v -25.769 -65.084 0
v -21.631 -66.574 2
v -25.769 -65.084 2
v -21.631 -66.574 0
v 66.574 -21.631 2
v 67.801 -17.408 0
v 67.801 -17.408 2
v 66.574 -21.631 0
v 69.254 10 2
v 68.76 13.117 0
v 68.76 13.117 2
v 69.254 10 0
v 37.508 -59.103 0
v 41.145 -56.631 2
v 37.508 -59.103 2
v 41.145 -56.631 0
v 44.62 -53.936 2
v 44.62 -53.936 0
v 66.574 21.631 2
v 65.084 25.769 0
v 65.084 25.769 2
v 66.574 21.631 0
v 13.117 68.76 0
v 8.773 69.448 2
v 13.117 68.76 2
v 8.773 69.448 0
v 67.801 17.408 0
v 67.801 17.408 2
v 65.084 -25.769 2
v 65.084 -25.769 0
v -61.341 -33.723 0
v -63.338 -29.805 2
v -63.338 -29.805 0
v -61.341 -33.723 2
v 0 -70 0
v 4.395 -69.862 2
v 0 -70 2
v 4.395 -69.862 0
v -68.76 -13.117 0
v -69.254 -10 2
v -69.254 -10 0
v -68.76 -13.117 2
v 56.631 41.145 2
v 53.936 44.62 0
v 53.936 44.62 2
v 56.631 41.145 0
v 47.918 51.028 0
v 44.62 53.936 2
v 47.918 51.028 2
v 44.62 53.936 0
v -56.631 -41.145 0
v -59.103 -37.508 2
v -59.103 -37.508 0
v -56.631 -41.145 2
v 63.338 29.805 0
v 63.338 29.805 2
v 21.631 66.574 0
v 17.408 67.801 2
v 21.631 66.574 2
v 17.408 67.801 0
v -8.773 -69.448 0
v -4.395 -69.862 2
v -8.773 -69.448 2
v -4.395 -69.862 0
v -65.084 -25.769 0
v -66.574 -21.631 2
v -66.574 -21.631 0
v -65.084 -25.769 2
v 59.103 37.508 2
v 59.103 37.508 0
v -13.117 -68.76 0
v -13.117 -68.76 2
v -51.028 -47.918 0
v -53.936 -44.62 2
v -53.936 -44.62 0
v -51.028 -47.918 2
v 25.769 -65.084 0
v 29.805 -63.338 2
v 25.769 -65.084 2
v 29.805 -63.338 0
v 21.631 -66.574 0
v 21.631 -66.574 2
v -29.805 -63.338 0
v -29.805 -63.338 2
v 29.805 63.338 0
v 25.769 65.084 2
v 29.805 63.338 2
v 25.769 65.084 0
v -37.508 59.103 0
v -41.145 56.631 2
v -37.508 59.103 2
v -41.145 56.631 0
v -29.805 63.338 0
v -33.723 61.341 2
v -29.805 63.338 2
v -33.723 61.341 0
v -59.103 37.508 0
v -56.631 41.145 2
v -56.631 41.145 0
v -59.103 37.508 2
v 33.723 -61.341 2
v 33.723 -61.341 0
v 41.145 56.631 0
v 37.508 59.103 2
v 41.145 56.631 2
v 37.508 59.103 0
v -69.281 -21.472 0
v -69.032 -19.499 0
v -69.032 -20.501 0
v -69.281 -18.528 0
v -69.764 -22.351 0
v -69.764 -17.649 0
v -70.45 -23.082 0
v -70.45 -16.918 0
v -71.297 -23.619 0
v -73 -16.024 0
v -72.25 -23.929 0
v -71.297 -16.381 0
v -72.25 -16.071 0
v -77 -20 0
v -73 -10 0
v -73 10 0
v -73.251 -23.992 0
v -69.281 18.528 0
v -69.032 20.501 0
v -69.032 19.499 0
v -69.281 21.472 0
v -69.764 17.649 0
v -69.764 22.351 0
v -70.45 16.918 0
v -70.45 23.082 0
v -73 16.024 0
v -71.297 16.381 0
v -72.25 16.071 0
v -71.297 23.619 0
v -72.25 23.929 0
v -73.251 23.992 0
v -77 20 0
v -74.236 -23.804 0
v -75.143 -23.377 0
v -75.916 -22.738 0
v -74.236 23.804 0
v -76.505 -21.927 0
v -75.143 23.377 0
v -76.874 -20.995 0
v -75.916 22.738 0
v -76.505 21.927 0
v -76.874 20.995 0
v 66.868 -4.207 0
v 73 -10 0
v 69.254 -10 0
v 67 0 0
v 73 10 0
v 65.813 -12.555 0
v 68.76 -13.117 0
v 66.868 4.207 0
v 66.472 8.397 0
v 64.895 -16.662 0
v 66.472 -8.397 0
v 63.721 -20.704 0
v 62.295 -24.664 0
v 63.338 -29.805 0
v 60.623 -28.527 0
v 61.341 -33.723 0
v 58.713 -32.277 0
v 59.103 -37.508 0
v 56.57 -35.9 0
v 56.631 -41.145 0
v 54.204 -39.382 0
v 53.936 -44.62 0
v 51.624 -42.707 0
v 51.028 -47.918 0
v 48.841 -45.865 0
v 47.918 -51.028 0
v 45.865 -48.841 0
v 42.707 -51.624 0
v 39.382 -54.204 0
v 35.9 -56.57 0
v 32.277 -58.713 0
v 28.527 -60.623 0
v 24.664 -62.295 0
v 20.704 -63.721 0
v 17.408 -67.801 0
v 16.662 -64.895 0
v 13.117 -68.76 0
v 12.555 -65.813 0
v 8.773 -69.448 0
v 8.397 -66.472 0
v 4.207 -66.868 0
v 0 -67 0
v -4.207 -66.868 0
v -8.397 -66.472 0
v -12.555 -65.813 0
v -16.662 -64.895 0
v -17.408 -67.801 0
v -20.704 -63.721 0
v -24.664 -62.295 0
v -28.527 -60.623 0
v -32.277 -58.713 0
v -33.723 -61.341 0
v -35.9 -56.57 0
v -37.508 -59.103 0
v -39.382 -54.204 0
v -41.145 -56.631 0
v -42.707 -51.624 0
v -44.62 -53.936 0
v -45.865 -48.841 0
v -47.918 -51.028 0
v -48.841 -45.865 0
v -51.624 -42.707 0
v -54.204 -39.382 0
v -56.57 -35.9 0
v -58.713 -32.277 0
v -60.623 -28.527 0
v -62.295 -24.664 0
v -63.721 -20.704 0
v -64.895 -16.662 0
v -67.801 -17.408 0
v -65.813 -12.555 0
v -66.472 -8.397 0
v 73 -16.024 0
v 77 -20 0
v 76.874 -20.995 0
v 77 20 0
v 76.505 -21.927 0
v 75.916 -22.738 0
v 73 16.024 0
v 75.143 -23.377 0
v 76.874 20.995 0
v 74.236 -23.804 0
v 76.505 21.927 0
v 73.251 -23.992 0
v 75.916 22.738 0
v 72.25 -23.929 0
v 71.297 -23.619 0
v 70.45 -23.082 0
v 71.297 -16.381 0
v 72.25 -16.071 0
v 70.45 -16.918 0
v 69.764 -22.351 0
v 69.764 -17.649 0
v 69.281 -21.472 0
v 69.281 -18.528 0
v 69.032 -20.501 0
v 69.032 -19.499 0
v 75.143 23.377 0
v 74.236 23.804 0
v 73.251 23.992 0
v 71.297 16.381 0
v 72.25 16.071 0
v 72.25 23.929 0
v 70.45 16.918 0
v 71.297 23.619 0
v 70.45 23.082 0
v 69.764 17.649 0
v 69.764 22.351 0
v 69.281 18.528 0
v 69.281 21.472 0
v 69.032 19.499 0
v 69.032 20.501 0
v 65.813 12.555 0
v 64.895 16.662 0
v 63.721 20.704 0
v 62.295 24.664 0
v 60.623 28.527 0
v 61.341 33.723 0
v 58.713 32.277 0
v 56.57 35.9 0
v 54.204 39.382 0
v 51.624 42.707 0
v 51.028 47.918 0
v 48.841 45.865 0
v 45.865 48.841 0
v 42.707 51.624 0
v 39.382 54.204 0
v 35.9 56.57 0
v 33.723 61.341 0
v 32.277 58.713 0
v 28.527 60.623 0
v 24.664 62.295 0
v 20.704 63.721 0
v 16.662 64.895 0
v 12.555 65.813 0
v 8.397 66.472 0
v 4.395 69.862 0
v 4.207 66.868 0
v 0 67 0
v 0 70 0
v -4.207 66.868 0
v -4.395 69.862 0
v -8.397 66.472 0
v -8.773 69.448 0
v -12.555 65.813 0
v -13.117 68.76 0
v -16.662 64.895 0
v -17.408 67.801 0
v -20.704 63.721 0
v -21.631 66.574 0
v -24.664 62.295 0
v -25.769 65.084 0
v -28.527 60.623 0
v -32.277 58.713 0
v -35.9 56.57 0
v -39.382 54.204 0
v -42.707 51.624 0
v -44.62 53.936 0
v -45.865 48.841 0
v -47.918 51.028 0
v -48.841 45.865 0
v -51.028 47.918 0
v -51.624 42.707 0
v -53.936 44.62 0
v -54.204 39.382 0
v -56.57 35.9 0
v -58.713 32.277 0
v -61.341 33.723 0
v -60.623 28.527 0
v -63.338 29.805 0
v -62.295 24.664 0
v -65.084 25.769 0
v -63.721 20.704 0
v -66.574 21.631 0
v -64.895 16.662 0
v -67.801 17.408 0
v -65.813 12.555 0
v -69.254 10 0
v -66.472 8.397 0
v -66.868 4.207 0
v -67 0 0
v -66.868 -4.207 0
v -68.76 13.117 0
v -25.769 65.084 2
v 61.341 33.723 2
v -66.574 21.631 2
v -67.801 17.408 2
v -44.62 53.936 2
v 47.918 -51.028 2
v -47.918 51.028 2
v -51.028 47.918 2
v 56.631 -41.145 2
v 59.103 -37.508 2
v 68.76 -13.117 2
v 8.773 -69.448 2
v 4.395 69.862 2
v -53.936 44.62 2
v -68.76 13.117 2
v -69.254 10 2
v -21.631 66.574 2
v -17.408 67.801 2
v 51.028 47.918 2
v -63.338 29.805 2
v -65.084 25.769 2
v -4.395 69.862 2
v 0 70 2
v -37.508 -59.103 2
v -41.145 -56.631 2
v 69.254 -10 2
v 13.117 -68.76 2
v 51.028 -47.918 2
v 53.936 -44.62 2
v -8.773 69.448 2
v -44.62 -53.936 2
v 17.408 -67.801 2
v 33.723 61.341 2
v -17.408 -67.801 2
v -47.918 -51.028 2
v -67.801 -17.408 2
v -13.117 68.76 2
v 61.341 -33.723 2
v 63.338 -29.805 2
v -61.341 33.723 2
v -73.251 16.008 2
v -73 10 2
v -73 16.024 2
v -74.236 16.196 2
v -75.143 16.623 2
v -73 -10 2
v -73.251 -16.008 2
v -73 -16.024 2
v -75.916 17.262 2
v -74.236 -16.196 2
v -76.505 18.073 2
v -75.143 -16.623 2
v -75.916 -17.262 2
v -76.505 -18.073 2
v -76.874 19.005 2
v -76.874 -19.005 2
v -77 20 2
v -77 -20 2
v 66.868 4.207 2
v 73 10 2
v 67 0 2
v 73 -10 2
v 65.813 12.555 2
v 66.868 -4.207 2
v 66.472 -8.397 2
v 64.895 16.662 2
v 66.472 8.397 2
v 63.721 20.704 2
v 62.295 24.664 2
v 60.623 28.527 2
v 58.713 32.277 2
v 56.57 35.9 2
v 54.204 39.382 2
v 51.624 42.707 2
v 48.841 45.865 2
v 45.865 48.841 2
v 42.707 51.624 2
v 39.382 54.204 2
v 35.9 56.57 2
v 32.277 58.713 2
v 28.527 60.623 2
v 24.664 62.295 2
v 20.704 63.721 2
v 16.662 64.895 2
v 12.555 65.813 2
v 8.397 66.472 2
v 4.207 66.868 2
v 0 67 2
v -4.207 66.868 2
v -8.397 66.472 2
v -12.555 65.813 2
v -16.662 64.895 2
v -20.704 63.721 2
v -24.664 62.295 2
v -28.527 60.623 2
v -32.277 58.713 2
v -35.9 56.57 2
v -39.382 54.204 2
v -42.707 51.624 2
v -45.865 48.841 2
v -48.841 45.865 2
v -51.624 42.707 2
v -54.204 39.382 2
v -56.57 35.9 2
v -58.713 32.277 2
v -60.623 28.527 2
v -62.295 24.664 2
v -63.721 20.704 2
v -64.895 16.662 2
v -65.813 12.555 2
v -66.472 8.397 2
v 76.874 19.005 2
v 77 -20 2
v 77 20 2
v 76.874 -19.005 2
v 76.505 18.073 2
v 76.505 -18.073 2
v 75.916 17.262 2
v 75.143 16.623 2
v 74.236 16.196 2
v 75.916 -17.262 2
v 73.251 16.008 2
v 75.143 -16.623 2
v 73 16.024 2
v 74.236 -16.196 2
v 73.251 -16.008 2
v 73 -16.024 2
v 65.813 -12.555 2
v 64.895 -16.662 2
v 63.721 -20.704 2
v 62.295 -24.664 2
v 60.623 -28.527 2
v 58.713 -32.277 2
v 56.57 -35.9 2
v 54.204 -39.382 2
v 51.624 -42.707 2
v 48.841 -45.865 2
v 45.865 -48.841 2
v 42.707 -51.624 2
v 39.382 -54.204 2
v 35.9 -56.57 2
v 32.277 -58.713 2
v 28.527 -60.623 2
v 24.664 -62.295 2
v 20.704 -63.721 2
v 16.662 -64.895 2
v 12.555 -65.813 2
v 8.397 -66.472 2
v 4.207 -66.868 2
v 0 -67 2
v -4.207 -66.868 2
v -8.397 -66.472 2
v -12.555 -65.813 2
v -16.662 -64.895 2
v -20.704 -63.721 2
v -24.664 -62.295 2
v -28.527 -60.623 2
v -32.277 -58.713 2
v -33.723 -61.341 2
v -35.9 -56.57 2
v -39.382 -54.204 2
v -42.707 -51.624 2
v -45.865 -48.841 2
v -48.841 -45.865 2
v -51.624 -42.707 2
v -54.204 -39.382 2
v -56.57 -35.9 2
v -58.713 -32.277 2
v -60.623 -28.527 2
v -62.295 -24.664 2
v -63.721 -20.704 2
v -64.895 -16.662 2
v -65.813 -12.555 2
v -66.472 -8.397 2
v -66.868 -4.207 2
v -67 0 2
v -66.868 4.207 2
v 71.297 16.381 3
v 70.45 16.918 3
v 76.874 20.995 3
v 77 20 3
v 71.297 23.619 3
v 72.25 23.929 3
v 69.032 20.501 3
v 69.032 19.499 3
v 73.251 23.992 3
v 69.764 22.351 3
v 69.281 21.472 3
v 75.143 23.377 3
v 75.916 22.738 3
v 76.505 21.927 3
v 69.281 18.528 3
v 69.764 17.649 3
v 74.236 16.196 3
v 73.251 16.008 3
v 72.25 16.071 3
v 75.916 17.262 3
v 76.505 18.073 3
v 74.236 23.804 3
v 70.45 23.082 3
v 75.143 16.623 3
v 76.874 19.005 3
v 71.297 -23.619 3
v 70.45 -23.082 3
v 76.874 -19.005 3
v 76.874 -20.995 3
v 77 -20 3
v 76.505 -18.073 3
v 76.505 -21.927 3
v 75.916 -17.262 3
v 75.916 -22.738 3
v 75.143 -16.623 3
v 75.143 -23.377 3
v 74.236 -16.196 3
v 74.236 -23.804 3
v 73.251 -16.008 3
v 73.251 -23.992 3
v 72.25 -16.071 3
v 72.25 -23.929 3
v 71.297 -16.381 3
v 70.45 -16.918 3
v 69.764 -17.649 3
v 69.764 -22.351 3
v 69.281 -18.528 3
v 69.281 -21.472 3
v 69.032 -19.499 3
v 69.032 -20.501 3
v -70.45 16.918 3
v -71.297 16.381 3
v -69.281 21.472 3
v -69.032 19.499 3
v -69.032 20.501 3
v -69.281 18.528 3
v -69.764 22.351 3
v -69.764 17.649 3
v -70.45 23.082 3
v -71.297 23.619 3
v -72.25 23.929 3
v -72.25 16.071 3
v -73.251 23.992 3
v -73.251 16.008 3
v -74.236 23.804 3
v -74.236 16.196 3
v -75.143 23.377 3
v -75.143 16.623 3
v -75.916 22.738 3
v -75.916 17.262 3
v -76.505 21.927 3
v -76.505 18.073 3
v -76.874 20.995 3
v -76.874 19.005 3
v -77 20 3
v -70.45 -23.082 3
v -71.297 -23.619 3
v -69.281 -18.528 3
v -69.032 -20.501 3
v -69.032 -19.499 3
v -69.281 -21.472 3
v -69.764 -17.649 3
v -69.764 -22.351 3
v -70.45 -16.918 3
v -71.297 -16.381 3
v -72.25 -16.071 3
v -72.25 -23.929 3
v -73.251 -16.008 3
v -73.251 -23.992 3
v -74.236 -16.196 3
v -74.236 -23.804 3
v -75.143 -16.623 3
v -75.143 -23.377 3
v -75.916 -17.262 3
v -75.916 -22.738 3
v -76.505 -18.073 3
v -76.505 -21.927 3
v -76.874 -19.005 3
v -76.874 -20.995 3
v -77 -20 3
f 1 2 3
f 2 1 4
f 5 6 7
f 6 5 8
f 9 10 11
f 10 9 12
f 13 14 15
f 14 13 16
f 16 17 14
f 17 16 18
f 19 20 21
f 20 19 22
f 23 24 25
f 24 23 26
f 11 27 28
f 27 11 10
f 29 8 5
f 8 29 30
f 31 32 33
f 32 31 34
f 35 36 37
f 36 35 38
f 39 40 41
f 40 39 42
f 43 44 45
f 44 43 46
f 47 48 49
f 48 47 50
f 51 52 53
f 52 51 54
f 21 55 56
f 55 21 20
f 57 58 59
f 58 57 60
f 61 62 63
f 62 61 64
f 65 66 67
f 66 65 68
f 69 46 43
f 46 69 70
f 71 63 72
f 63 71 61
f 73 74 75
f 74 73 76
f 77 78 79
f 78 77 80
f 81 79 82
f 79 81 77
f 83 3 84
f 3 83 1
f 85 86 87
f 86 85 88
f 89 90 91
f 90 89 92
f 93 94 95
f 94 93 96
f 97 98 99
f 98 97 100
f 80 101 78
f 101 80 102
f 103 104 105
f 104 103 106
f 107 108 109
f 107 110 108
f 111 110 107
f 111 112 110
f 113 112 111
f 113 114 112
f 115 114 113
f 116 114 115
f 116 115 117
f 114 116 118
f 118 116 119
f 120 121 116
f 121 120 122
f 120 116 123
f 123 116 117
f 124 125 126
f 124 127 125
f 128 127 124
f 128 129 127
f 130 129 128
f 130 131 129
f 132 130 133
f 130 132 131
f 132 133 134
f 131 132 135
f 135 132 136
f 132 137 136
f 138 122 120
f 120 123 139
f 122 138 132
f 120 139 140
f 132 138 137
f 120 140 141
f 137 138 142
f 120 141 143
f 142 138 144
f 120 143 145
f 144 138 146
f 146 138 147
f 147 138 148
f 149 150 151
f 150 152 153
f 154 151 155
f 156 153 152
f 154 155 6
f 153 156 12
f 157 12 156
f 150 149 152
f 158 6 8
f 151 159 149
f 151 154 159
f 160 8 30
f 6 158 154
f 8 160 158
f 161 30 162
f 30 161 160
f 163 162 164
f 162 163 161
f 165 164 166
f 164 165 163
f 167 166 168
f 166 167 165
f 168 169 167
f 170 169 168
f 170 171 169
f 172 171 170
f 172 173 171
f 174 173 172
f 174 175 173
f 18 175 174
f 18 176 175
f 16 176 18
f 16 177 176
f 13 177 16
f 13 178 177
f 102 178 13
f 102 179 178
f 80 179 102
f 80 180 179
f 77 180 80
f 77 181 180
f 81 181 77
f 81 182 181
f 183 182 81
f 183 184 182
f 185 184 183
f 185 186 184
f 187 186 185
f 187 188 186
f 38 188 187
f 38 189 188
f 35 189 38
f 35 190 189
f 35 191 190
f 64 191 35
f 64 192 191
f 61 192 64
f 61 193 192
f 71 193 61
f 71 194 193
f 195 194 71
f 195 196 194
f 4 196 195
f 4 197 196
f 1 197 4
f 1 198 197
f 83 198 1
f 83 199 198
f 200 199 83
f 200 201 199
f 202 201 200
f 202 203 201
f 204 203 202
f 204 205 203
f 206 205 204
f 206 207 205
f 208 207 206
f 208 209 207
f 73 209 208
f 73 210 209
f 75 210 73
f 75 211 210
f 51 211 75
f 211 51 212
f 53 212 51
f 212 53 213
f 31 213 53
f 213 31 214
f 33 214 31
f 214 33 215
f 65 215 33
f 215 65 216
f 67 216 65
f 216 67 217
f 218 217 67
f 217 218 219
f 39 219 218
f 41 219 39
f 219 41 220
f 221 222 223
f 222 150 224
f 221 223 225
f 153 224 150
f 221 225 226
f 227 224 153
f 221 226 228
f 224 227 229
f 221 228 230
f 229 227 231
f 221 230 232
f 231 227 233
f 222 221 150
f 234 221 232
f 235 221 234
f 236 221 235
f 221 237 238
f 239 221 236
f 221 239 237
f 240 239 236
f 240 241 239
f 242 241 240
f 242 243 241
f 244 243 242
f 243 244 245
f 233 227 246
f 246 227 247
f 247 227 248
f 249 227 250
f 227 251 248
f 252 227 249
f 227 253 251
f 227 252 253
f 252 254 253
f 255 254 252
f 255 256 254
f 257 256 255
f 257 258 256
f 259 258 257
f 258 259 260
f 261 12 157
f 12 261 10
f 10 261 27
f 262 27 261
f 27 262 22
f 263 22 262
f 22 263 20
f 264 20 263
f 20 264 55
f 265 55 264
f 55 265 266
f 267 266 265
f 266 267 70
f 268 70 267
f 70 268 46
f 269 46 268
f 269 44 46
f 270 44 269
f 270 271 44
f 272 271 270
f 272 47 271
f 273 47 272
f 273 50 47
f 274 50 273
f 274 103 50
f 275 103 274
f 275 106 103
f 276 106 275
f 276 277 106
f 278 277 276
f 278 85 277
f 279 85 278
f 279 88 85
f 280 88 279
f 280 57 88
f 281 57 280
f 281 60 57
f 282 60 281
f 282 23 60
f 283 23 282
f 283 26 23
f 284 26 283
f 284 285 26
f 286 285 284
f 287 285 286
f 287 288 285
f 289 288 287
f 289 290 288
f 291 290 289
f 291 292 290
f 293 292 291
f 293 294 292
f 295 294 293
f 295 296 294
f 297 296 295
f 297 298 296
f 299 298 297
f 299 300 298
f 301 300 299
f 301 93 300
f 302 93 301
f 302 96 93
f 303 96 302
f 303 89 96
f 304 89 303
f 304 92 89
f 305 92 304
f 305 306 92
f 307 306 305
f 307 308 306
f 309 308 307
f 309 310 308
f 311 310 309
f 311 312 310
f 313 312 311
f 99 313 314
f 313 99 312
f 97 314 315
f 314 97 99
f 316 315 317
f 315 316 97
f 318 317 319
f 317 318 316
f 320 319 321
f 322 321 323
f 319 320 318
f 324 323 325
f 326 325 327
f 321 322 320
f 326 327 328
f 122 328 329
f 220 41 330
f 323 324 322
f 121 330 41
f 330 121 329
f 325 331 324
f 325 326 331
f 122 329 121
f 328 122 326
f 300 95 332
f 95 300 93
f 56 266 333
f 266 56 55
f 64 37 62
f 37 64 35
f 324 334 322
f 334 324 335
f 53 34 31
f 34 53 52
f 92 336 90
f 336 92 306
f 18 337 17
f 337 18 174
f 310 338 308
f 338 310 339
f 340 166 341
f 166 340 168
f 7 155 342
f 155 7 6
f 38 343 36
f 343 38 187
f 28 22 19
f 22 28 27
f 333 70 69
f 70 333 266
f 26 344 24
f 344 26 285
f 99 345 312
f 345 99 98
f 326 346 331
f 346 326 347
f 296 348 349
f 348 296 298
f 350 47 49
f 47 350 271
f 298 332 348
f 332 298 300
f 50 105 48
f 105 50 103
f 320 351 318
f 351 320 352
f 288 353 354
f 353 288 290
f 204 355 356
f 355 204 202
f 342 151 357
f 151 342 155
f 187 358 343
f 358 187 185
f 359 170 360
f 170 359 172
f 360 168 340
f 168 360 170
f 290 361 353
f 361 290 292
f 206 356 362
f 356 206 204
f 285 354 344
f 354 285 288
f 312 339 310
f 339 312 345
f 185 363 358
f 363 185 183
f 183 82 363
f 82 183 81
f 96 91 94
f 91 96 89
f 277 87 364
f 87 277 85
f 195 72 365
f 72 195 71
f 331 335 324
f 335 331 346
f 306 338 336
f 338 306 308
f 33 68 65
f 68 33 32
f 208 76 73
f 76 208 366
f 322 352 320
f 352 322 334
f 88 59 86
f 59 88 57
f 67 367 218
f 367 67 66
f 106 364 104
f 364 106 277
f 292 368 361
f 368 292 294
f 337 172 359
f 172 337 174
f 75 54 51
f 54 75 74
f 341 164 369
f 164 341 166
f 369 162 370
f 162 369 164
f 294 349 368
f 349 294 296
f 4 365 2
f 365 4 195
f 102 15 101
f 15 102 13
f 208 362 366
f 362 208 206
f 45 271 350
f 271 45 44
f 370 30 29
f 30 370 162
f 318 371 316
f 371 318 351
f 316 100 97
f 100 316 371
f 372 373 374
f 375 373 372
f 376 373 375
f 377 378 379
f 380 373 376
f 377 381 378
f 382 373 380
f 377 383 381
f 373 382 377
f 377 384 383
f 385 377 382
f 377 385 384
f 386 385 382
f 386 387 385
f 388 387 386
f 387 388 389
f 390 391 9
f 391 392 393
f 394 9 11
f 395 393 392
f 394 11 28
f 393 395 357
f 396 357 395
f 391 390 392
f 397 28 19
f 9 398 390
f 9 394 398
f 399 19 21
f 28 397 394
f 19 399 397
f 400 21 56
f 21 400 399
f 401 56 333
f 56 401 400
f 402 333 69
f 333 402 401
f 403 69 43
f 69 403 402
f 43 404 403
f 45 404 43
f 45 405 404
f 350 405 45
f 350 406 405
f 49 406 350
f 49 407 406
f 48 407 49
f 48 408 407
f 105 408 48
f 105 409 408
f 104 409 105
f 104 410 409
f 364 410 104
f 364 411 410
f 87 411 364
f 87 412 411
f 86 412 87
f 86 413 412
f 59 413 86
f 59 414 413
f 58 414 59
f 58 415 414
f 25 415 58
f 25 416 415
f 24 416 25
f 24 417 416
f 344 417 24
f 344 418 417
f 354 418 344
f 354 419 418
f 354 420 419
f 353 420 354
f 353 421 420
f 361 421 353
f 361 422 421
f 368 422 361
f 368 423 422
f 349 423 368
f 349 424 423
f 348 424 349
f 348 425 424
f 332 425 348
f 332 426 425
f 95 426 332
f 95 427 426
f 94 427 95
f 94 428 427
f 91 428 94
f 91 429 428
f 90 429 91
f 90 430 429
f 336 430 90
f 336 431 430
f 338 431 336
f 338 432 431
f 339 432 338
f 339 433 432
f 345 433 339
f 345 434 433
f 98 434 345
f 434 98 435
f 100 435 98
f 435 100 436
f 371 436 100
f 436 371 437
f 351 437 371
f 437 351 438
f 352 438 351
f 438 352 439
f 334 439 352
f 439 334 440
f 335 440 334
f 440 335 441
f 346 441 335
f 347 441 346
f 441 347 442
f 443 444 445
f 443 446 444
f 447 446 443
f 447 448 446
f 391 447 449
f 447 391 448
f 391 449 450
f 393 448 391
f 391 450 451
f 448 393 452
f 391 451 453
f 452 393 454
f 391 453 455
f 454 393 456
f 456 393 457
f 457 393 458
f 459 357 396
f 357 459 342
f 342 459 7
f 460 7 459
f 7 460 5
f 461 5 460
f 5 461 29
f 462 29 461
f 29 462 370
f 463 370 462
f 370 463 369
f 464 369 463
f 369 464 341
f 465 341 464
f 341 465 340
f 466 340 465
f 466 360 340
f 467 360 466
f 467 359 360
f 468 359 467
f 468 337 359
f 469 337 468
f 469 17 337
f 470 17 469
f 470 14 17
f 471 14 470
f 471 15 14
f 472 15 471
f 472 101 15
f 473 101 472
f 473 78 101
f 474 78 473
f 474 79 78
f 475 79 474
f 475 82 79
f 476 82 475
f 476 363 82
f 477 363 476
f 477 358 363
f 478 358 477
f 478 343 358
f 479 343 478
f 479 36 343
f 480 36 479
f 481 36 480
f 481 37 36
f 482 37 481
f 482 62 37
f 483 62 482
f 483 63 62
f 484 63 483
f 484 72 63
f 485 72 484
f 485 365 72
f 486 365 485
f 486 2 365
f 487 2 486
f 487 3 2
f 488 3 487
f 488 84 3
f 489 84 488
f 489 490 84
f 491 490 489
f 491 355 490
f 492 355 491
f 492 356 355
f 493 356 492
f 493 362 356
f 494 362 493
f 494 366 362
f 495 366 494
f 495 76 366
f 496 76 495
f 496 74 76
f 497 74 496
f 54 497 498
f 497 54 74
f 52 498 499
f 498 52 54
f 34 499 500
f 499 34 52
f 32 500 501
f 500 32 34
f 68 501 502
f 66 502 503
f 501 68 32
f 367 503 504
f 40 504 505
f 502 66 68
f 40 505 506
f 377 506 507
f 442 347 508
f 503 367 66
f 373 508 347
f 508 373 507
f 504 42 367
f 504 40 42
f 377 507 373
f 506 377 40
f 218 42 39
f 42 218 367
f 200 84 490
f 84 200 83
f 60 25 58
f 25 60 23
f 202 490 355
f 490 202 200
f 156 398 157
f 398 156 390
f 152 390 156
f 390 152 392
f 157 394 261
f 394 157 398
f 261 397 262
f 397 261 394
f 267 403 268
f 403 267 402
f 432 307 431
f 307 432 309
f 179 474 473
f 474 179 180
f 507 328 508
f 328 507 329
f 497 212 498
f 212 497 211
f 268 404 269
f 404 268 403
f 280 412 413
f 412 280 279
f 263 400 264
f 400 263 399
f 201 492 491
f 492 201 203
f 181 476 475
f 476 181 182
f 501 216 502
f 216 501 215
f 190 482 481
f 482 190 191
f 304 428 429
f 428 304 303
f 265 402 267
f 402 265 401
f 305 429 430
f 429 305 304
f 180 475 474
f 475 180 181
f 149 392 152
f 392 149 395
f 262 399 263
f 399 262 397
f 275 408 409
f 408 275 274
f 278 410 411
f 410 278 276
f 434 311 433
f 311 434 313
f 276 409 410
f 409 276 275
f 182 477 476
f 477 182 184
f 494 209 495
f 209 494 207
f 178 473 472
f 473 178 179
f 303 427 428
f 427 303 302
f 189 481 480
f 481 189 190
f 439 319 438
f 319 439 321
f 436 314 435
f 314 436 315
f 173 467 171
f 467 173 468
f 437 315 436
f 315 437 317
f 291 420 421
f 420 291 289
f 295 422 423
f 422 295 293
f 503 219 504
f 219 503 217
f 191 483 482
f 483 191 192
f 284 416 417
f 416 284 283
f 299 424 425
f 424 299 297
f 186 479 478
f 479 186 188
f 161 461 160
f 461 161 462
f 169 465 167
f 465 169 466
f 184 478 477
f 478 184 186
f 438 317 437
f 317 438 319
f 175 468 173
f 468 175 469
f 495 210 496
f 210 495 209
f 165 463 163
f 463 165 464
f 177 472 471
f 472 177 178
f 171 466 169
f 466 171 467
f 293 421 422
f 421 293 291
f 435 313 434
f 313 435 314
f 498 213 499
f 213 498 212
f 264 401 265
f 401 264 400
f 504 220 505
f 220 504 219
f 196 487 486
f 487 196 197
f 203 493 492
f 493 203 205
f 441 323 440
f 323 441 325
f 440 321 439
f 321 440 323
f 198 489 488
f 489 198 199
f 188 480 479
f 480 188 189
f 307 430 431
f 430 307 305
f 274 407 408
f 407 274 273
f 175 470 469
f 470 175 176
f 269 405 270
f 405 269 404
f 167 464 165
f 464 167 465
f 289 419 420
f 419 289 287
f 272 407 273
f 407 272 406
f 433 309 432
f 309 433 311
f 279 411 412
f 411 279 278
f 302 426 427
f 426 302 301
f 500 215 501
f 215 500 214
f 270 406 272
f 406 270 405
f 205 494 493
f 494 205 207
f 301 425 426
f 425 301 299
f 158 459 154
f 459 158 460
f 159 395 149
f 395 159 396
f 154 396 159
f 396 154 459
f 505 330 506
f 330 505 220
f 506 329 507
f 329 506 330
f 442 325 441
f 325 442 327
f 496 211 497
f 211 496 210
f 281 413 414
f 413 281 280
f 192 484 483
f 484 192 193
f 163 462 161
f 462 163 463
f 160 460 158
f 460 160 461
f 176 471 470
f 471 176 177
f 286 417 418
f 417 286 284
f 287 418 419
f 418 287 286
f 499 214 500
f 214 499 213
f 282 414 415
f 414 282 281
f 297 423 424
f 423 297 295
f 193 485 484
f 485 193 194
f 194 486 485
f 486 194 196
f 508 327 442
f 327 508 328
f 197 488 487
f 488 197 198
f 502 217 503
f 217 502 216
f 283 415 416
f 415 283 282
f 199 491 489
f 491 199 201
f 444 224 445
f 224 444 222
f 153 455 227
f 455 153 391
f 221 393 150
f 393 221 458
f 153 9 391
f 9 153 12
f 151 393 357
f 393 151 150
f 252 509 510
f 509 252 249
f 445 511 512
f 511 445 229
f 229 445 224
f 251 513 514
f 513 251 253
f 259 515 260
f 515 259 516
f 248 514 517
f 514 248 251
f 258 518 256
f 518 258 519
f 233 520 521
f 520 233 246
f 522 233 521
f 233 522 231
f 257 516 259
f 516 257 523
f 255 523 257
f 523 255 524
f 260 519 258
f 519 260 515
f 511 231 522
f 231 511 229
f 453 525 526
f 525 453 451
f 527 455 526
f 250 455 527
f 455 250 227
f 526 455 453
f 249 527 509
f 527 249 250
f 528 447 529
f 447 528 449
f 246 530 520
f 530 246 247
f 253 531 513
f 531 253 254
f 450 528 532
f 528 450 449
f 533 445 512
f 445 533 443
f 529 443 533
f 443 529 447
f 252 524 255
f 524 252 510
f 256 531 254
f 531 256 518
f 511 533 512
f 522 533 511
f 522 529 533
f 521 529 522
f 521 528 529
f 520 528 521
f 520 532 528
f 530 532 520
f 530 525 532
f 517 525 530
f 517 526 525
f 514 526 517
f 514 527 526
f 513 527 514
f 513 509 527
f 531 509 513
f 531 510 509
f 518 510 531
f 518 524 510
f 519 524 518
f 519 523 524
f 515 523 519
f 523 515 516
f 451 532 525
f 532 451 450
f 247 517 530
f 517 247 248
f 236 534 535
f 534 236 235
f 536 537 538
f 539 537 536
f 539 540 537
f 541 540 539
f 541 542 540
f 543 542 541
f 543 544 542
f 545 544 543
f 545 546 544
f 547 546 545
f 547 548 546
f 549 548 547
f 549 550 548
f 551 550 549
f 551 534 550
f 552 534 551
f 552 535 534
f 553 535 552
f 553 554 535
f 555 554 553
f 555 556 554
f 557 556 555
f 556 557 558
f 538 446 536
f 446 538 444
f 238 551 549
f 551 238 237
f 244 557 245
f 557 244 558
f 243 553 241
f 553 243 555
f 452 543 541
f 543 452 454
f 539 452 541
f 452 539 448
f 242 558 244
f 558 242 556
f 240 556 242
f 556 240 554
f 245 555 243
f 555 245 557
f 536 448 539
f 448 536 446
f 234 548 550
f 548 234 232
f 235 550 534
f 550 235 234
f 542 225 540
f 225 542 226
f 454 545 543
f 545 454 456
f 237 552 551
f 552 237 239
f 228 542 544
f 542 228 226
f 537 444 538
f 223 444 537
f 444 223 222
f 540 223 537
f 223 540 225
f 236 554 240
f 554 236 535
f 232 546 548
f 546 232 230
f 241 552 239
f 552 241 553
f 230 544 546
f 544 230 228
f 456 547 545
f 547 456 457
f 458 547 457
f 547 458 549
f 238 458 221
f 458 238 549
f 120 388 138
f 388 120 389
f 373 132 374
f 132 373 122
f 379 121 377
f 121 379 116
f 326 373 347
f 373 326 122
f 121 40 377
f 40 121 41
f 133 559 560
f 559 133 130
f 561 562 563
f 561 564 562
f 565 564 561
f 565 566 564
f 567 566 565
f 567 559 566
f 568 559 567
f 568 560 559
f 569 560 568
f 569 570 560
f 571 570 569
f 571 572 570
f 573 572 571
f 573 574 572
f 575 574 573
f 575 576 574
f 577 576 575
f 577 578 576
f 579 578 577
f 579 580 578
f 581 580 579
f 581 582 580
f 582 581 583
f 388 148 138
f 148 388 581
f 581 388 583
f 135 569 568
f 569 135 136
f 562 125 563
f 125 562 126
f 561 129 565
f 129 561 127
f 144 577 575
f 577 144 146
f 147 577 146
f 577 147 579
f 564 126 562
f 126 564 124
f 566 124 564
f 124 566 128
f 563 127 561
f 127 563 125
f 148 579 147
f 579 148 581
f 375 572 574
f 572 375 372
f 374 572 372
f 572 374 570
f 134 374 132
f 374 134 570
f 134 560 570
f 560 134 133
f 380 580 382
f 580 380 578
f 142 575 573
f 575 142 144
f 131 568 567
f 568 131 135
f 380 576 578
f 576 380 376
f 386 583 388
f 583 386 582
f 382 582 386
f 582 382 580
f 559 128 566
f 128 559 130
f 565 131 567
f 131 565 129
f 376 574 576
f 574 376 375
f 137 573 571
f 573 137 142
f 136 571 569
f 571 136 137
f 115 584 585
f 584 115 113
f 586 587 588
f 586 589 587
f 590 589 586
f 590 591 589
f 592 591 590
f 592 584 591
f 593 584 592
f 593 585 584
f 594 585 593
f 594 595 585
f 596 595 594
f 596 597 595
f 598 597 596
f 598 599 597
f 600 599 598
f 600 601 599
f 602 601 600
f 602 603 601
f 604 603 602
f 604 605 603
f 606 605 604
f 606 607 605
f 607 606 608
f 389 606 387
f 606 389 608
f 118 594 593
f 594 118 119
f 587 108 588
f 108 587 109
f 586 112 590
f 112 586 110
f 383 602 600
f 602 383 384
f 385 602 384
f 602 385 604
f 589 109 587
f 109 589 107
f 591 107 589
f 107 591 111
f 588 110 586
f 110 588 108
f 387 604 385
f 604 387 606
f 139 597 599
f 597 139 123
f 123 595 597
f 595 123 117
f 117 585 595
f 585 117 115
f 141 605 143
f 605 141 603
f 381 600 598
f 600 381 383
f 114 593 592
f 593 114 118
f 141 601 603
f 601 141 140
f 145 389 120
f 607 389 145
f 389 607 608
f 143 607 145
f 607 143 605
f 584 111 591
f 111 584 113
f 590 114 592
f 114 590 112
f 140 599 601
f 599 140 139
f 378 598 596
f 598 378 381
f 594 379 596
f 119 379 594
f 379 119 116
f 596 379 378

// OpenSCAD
t = 2;      // thickness
d = 140;    // diameter

difference(){
    cylinder (t, d/2, d/2, false, $fn = 100);
    cylinder (t*3, d/2-3, d/2-3, true, $fn = 100);
}
handle();
mirror([1 ,0, 0])handle();

module handle(){
    translate([d/2 +5, 0, t/2])cube([4, 40, t], true);
    translate([d/2, 0, t/2])cube([6, 20, t], true);
    translate([d/2+3, 20, 0])cylinder(1.5*t, 4, 4, false, $fn = 25);
    translate([d/2+3, -20, 0])cylinder(1.5*t, 4, 4, false, $fn = 25);
}
